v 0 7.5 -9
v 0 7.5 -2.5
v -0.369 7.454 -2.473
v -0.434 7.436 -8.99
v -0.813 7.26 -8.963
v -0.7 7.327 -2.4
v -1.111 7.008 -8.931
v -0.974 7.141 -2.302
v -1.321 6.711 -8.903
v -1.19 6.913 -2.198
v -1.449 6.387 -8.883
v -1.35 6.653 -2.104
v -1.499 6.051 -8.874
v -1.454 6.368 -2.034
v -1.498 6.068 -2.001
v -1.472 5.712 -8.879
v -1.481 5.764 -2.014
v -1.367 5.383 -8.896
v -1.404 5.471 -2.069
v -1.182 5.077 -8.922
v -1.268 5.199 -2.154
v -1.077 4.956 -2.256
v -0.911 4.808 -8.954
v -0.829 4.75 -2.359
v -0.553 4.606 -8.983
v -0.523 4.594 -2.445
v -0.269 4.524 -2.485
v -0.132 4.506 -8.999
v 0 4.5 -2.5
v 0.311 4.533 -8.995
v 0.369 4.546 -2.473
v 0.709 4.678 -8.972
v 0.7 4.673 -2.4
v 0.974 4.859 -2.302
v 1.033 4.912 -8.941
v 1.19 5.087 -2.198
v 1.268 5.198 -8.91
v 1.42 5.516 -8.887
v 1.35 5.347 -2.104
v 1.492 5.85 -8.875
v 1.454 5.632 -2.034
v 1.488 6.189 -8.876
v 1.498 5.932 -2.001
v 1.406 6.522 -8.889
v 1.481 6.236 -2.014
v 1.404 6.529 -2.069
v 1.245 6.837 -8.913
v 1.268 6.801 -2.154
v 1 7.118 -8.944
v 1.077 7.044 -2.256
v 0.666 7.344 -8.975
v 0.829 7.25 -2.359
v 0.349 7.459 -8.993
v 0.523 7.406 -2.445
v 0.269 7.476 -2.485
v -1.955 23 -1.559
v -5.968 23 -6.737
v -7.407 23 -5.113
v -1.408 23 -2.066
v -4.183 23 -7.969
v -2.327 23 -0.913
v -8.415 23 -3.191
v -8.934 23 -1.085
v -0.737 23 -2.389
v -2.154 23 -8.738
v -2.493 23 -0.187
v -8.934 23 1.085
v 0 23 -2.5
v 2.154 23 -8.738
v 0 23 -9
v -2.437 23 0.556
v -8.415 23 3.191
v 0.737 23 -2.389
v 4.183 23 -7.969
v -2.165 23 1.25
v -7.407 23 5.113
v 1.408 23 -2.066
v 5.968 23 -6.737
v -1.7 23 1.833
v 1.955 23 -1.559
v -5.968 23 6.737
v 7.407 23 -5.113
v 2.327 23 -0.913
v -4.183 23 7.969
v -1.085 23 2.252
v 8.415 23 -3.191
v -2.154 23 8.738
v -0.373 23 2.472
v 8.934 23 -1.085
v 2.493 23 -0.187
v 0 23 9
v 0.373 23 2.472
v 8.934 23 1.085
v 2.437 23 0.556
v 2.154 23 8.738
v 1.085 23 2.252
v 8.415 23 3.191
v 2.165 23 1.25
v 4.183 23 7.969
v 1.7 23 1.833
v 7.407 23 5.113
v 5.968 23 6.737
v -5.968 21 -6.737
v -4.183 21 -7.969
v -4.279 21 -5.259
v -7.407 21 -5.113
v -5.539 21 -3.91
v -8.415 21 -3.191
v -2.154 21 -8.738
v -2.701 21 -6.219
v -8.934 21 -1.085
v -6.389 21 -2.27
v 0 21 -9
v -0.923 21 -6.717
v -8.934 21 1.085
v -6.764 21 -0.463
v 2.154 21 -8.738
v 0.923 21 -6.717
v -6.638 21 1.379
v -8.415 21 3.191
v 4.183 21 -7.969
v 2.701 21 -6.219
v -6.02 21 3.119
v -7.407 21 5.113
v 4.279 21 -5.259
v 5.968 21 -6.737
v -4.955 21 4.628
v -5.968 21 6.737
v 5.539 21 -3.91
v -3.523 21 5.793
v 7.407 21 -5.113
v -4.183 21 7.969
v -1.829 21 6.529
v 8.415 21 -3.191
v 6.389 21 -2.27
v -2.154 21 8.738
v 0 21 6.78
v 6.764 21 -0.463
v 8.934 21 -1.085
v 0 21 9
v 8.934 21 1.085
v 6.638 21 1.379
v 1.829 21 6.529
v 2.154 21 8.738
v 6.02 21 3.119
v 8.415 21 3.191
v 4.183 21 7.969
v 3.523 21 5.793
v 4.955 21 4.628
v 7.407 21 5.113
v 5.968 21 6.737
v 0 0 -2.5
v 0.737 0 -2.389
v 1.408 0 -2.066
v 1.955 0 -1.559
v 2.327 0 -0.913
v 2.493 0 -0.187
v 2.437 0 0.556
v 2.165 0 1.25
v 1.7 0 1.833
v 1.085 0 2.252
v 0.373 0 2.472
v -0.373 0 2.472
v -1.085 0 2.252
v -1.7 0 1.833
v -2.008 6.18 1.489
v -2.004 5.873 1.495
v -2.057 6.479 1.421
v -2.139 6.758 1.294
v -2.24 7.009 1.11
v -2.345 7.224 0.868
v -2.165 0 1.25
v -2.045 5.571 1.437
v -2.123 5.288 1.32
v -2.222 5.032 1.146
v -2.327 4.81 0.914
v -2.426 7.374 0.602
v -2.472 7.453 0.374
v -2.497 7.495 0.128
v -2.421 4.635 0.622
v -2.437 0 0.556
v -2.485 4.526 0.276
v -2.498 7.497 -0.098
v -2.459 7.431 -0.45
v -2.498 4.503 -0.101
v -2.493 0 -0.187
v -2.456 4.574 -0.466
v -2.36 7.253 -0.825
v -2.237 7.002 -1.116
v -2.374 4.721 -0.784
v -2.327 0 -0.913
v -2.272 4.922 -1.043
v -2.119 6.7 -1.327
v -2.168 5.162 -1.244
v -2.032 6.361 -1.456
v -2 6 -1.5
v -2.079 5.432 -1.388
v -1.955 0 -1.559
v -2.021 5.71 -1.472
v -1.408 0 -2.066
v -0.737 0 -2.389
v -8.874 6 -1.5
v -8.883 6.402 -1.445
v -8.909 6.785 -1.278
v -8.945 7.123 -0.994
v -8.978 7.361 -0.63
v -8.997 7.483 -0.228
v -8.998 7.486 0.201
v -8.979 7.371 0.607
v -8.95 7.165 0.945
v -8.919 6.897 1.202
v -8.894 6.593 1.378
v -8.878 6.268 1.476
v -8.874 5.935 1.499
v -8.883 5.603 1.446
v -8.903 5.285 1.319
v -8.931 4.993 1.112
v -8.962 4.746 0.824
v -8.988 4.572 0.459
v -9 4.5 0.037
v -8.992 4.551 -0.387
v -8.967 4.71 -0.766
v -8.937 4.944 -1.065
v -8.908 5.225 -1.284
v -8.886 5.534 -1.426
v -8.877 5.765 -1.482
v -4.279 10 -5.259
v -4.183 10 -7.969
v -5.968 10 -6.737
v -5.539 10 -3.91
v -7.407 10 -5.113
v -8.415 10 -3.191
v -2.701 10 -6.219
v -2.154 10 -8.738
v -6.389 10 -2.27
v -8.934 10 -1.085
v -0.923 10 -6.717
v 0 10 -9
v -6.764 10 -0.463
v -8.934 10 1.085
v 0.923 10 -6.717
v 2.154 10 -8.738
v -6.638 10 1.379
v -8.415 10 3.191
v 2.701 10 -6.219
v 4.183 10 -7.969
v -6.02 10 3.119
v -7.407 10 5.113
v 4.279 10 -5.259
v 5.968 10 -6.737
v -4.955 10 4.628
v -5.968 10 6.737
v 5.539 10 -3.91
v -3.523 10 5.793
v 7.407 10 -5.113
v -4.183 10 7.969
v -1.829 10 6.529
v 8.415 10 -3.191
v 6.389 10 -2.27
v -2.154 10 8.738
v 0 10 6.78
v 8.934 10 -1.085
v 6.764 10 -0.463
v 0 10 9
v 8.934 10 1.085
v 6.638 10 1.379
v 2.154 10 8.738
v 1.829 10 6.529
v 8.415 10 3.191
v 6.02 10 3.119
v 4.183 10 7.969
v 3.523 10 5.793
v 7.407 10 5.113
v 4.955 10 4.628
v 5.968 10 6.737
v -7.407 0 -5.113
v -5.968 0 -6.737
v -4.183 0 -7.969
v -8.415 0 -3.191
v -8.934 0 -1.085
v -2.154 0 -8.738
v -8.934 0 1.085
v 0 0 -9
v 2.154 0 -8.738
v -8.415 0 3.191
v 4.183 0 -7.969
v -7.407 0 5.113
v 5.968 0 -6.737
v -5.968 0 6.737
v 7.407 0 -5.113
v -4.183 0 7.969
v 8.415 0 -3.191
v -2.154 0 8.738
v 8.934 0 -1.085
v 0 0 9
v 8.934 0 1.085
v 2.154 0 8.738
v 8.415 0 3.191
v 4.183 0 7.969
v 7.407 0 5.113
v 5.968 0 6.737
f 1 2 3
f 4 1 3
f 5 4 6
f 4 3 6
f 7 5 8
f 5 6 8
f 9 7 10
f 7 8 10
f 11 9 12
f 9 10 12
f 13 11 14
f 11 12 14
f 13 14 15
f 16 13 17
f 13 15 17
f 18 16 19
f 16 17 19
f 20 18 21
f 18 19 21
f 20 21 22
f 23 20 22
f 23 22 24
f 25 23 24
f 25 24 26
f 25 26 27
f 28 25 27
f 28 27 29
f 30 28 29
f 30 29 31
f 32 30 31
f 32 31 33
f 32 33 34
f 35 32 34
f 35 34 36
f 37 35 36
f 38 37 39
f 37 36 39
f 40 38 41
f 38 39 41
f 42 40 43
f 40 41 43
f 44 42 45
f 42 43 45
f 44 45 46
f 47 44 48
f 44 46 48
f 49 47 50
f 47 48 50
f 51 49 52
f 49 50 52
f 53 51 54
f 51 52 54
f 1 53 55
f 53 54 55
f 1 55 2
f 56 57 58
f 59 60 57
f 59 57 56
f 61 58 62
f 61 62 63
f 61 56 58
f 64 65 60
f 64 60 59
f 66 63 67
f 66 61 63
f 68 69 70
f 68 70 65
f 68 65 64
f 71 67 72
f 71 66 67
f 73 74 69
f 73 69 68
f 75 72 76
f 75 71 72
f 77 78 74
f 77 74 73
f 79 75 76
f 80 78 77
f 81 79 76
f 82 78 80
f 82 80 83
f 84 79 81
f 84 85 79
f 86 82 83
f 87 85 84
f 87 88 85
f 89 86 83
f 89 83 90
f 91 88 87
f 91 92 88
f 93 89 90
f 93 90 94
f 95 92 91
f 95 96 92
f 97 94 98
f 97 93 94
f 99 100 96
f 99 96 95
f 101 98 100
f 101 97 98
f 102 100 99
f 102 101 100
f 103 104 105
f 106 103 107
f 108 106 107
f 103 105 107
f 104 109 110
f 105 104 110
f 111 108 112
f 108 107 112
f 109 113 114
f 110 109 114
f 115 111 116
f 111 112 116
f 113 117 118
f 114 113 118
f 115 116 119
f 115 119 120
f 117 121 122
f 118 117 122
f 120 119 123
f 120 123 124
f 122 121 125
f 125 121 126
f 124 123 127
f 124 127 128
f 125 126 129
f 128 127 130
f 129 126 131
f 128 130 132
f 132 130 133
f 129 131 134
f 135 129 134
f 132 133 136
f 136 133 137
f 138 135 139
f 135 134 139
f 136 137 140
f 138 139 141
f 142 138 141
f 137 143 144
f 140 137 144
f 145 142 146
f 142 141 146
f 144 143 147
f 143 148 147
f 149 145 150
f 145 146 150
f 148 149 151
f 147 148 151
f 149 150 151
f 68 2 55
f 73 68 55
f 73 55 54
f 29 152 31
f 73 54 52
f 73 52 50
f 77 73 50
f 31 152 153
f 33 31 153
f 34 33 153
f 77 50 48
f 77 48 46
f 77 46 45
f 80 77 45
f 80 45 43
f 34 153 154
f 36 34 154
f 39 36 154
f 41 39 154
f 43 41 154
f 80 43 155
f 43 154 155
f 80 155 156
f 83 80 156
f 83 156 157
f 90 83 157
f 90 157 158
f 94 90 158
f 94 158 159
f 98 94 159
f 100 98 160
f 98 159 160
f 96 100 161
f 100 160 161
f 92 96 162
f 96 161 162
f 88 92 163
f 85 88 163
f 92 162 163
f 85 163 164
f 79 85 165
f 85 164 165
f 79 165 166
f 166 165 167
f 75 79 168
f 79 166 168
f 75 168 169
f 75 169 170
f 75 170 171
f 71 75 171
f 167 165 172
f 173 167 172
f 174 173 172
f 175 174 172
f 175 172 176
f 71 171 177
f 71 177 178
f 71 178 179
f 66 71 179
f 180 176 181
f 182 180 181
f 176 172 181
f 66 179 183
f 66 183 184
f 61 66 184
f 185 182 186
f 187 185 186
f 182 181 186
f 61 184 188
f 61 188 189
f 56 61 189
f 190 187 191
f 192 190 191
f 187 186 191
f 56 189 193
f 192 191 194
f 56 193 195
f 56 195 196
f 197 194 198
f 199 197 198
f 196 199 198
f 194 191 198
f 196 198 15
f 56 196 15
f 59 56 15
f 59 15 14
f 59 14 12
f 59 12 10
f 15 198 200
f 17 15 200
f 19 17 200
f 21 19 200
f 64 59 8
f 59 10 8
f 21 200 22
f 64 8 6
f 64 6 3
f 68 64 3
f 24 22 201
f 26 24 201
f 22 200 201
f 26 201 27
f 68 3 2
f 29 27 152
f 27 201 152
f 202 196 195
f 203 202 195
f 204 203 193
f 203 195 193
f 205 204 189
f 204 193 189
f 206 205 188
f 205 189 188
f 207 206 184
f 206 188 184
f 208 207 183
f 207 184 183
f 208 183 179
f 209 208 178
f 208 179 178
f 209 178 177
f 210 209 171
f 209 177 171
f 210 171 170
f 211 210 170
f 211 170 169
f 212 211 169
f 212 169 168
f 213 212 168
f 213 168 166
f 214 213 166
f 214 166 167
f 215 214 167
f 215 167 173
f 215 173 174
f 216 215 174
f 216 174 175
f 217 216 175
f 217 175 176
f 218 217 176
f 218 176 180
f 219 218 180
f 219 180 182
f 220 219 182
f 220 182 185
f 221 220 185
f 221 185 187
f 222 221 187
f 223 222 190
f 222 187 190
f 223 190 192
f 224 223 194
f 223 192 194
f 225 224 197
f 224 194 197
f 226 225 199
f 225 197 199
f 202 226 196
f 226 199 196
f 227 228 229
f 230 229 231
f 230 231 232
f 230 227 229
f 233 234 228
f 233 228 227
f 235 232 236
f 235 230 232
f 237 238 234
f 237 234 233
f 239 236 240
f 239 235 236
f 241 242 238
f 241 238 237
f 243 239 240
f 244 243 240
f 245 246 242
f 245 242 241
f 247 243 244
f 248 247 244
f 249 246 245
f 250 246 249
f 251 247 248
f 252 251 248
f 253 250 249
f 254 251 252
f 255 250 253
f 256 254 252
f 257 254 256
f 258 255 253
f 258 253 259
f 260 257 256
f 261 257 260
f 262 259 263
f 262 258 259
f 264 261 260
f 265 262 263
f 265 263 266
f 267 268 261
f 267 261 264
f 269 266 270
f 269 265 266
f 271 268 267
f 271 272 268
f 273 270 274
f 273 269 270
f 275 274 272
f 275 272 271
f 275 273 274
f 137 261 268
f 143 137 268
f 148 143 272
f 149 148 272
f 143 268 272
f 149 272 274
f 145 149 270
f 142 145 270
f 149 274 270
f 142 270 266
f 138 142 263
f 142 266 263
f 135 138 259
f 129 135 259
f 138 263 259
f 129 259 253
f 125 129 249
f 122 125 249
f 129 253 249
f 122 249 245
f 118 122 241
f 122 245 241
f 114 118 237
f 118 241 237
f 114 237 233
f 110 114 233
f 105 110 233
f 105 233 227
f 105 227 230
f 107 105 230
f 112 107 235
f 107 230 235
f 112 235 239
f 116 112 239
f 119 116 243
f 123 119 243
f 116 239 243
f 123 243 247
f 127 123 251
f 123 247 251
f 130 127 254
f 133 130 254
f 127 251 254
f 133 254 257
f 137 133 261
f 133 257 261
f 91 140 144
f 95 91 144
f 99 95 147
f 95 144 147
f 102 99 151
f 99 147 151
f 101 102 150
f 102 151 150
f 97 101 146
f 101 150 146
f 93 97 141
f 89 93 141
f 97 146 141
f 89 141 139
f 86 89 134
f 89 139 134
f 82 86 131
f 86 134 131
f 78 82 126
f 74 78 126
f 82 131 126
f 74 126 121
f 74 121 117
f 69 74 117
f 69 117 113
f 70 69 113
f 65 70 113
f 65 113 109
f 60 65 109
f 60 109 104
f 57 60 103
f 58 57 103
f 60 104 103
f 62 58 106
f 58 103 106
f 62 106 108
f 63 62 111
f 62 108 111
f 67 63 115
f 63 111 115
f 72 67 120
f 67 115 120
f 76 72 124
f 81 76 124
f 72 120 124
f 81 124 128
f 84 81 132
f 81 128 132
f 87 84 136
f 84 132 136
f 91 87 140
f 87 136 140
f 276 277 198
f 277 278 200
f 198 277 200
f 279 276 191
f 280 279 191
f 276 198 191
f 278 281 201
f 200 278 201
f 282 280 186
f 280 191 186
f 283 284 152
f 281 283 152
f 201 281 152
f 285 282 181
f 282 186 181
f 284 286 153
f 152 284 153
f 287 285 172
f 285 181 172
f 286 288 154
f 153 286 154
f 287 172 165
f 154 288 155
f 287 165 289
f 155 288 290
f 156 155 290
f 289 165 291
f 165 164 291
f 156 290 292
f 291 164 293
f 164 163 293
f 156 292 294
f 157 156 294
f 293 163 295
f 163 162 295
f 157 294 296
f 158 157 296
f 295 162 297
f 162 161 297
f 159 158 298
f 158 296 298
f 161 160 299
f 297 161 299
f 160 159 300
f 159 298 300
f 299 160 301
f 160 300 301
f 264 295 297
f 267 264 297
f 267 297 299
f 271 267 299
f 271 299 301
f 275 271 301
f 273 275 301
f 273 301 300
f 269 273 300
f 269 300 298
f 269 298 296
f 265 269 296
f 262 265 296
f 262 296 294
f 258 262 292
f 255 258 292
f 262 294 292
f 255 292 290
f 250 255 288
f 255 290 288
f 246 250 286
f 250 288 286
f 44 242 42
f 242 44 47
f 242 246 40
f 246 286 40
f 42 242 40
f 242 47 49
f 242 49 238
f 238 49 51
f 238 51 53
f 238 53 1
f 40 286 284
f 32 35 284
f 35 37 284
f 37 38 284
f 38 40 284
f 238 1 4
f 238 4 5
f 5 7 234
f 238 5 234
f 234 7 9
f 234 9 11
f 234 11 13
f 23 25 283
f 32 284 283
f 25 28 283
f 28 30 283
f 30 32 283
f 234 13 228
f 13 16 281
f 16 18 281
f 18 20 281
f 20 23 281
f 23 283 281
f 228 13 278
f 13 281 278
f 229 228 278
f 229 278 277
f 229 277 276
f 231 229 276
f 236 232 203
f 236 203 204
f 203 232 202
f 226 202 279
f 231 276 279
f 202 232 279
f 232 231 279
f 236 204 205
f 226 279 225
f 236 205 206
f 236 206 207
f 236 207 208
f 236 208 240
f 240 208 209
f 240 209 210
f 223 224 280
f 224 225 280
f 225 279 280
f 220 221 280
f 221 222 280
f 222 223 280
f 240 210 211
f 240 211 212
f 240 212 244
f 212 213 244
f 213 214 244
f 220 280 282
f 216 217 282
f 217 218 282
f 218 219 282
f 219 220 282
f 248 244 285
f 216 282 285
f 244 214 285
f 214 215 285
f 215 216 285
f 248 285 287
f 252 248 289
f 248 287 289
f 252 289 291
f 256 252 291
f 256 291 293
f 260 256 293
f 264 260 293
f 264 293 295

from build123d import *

# Parameters (mm, degrees)
SKETCH_1_R          = 9
EXTRUDE_1_DEPTH     = 10
SKETCH_2_R          = 6.78
EXTRUDE_2_DEPTH     = 11
SKETCH_3_R          = 9
EXTRUDE_3_DEPTH     = 2
SKETCH_5_R          = 2.5
CUT_EXTRUDE_1_DEPTH = 27.286878856
SKETCH_6_R          = 1.5
CUT_EXTRUDE_2_DEPTH = 27.286878856
SKETCH_7_R          = 1.5
CUT_EXTRUDE_3_DEPTH = 27.286879012


with BuildPart() as part:
    # 草图1 → 凸台-拉伸1 (new body)
    with BuildSketch(Plane(origin=(0, 0, 0), x_dir=(1, 0, 0), z_dir=(0, 1, 0))):
        with Locations(Location((0, 0, 0), (0, 0, 270))):
            Circle(SKETCH_1_R)
    extrude(amount=EXTRUDE_1_DEPTH)

    # 草图2 → 凸台-拉伸2 (add)
    with BuildSketch(Plane(origin=(0, 10, 0), x_dir=(1, 0, 0), z_dir=(0, 1, 0))):
        with Locations(Location((0, 0, 0), (0, 0, 270))):
            Circle(SKETCH_2_R)
    extrude(amount=EXTRUDE_2_DEPTH)

    # 草图3 → 凸台-拉伸3 (add)
    with BuildSketch(Plane(origin=(0, 21, 0), x_dir=(1, 0, 0), z_dir=(0, 1, 0))):
        with Locations(Location((0, 0, 0), (0, 0, 270))):
            Circle(SKETCH_3_R)
    extrude(amount=EXTRUDE_3_DEPTH)

    # 草图5 → 切除-拉伸1 (cut, through all)
    with BuildSketch(Plane.XZ):
        with Locations(Location((0, 0, 0), (0, 0, 270))):
            Circle(SKETCH_5_R)
    extrude(amount=-CUT_EXTRUDE_1_DEPTH, mode=Mode.SUBTRACT)

    # 草图6 → 切除-拉伸2 (cut, through all)
    with BuildSketch(Plane.XY):
        with Locations(Location((0, 6, 0), (0, 0, 90))):
            Circle(SKETCH_6_R)
    extrude(amount=-CUT_EXTRUDE_2_DEPTH, mode=Mode.SUBTRACT)

    # 草图7 → 切除-拉伸3 (cut, through all)
    with BuildSketch(Plane(origin=(0, 0, 0), x_dir=(0, 0, -1), z_dir=(1, 0, 0))):
        with Locations((0, 6)):
            Circle(SKETCH_7_R)
    extrude(amount=-CUT_EXTRUDE_3_DEPTH, mode=Mode.SUBTRACT)


solid = part.part
